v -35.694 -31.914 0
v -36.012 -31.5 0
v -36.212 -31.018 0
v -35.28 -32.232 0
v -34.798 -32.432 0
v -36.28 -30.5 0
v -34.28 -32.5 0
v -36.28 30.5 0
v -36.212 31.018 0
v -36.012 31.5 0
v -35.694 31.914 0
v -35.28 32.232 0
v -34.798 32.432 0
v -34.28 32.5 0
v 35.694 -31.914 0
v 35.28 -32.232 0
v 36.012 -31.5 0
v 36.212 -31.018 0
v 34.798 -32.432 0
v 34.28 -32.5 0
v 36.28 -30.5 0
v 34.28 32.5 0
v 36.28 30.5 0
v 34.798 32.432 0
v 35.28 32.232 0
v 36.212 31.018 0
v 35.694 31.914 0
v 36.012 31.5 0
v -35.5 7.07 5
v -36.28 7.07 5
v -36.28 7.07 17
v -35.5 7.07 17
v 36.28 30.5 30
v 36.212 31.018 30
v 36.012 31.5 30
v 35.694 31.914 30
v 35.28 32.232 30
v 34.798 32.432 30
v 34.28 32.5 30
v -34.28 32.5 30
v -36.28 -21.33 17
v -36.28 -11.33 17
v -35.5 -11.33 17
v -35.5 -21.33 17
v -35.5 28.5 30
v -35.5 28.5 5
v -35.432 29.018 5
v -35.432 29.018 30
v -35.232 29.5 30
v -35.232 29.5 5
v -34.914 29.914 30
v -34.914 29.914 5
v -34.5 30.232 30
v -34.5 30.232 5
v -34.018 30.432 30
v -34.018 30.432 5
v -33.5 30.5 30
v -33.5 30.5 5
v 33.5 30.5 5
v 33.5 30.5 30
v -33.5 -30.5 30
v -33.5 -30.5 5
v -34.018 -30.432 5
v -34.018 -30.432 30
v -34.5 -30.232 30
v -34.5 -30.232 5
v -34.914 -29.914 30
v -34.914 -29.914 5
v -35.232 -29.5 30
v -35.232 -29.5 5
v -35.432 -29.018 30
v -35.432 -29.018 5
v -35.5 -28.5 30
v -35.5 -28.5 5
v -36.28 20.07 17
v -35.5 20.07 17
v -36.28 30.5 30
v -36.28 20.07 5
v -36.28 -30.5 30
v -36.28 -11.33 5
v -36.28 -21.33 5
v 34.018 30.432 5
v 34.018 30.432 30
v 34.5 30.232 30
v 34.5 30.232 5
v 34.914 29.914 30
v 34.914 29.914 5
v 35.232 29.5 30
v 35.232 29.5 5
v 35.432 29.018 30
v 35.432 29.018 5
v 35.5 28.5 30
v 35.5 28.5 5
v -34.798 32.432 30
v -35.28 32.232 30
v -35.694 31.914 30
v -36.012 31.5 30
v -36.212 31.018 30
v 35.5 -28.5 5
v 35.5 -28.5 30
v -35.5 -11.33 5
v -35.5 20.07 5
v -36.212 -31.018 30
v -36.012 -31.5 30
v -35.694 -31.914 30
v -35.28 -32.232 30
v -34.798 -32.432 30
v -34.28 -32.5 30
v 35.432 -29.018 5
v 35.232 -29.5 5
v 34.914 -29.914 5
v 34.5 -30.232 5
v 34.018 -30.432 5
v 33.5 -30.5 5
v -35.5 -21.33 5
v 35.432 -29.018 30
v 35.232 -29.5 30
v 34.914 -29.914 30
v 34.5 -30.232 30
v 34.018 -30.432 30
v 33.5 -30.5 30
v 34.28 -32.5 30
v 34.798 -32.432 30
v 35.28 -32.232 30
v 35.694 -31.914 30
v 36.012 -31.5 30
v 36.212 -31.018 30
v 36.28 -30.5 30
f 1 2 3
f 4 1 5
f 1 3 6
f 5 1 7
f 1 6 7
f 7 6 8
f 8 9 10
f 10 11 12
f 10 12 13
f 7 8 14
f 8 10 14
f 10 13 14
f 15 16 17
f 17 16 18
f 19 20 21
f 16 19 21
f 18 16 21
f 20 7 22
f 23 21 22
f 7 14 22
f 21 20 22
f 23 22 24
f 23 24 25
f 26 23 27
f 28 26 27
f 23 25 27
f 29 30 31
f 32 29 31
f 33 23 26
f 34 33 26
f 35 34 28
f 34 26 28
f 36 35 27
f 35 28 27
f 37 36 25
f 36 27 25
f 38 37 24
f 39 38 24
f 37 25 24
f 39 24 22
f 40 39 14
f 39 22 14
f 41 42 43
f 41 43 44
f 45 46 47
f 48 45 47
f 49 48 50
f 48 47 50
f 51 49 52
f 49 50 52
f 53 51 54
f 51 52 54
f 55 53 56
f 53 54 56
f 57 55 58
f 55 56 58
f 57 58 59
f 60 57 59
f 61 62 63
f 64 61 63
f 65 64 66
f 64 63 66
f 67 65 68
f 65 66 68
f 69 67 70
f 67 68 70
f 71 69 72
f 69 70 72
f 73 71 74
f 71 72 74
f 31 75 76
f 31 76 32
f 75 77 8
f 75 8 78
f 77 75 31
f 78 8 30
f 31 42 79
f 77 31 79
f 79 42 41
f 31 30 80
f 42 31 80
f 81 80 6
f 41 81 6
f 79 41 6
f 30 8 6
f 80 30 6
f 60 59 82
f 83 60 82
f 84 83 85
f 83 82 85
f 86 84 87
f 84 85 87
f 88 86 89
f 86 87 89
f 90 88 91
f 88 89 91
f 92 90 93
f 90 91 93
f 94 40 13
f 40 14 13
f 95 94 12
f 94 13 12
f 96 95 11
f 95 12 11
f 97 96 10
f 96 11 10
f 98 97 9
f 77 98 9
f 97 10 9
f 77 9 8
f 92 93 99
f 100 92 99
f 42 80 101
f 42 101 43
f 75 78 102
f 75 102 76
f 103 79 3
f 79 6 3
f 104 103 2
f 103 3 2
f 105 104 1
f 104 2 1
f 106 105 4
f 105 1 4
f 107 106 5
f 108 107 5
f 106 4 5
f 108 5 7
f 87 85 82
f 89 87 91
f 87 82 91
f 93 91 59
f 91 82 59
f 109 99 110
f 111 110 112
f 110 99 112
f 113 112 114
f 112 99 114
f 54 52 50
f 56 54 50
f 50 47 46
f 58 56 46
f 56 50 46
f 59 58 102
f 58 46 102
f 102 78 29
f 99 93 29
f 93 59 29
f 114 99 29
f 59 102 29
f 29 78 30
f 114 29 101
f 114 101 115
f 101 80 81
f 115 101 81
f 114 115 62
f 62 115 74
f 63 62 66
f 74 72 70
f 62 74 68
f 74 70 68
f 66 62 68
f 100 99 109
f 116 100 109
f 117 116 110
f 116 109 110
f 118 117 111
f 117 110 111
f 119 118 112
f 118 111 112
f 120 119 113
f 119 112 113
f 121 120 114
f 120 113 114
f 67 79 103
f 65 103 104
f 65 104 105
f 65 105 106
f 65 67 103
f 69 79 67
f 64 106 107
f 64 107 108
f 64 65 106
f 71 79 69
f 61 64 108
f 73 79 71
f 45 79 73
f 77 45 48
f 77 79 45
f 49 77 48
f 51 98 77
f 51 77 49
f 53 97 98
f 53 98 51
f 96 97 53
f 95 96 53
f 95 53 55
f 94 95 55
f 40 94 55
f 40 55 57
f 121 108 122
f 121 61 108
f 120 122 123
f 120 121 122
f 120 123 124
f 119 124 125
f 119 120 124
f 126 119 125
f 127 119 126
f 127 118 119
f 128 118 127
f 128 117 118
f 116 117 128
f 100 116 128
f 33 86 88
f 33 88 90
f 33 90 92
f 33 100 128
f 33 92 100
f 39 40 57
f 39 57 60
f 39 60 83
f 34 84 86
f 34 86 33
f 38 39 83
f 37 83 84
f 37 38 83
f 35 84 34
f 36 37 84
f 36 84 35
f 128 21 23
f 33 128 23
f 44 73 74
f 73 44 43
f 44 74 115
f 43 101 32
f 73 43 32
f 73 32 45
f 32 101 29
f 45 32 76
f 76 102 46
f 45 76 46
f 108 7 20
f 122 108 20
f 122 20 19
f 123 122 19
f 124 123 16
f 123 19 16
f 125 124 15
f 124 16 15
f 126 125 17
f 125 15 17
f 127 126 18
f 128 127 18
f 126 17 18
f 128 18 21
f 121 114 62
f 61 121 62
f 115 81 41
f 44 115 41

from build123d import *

# Parameters (mm, degrees)
F1_DEPTH = 5
F3_DEPTH = 25
F4_W     = 10
F4_H     = 12
F4_W_2   = 13
F5_DEPTH = 2.1


with BuildPart() as f1:
    # F0 (on Top) → F1 (new body)
    with BuildSketch(Plane.XY):
        with BuildLine():
            Line((34.28, 32.5), (-34.28, 32.5))
            ThreePointArc((-34.28, 32.5), (-35.694214, 31.914214), (-36.28, 30.5))
            Line((-36.28, 30.5), (-36.28, -30.5))
            ThreePointArc((-36.28, -30.5), (-35.694214, -31.914214), (-34.28, -32.5))
            Line((-34.28, -32.5), (34.28, -32.5))
            ThreePointArc((34.28, -32.5), (35.694214, -31.914214), (36.28, -30.5))
            Line((36.28, -30.5), (36.28, 30.5))
            ThreePointArc((36.28, 30.5), (35.694214, 31.914214), (34.28, 32.5))
        make_face()
    extrude(amount=F1_DEPTH)

    # F2 (on face) → F3 (join)
    with BuildSketch(Plane.XY.offset(5)):
        with BuildLine():
            ThreePointArc((36.28, 30.5), (35.694214, 31.914214), (34.28, 32.5))
            Line((34.28, 32.5), (-34.28, 32.5))
            ThreePointArc((-34.28, 32.5), (-35.694214, 31.914214), (-36.28, 30.5))
            Line((-36.28, 30.5), (-36.28, -30.5))
            ThreePointArc((-36.28, -30.5), (-35.694214, -31.914214), (-34.28, -32.5))
            Line((-34.28, -32.5), (34.28, -32.5))
            ThreePointArc((34.28, -32.5), (35.694214, -31.914214), (36.28, -30.5))
            Line((36.28, -30.5), (36.28, 30.5))
        make_face()
        with BuildLine():
            ThreePointArc((-35.5, 28.5), (-34.914214, 29.914214), (-33.5, 30.5))
            Line((-33.5, 30.5), (33.5, 30.5))
            ThreePointArc((33.5, 30.5), (34.914214, 29.914214), (35.5, 28.5))
            Line((35.5, 28.5), (35.5, -28.5))
            ThreePointArc((35.5, -28.5), (34.914214, -29.914214), (33.5, -30.5))
            Line((33.5, -30.5), (-33.5, -30.5))
            ThreePointArc((-33.5, -30.5), (-34.914214, -29.914214), (-35.5, -28.5))
            Line((-35.5, -28.5), (-35.5, 28.5))
        make_face(mode=Mode.SUBTRACT)
    extrude(amount=F3_DEPTH)

    # F4 (on face) → F5 (cut)
    with BuildSketch(Plane(origin=(-36.28, 0, 0), x_dir=(0, -1, 0), z_dir=(-1, 0, 0))):
        with Locations((16.33, 11)):
            Rectangle(F4_W, F4_H)
        with Locations((-13.57, 11)):
            Rectangle(F4_W_2, F4_H)
    extrude(amount=-F5_DEPTH, mode=Mode.SUBTRACT)


solid = f1.part
